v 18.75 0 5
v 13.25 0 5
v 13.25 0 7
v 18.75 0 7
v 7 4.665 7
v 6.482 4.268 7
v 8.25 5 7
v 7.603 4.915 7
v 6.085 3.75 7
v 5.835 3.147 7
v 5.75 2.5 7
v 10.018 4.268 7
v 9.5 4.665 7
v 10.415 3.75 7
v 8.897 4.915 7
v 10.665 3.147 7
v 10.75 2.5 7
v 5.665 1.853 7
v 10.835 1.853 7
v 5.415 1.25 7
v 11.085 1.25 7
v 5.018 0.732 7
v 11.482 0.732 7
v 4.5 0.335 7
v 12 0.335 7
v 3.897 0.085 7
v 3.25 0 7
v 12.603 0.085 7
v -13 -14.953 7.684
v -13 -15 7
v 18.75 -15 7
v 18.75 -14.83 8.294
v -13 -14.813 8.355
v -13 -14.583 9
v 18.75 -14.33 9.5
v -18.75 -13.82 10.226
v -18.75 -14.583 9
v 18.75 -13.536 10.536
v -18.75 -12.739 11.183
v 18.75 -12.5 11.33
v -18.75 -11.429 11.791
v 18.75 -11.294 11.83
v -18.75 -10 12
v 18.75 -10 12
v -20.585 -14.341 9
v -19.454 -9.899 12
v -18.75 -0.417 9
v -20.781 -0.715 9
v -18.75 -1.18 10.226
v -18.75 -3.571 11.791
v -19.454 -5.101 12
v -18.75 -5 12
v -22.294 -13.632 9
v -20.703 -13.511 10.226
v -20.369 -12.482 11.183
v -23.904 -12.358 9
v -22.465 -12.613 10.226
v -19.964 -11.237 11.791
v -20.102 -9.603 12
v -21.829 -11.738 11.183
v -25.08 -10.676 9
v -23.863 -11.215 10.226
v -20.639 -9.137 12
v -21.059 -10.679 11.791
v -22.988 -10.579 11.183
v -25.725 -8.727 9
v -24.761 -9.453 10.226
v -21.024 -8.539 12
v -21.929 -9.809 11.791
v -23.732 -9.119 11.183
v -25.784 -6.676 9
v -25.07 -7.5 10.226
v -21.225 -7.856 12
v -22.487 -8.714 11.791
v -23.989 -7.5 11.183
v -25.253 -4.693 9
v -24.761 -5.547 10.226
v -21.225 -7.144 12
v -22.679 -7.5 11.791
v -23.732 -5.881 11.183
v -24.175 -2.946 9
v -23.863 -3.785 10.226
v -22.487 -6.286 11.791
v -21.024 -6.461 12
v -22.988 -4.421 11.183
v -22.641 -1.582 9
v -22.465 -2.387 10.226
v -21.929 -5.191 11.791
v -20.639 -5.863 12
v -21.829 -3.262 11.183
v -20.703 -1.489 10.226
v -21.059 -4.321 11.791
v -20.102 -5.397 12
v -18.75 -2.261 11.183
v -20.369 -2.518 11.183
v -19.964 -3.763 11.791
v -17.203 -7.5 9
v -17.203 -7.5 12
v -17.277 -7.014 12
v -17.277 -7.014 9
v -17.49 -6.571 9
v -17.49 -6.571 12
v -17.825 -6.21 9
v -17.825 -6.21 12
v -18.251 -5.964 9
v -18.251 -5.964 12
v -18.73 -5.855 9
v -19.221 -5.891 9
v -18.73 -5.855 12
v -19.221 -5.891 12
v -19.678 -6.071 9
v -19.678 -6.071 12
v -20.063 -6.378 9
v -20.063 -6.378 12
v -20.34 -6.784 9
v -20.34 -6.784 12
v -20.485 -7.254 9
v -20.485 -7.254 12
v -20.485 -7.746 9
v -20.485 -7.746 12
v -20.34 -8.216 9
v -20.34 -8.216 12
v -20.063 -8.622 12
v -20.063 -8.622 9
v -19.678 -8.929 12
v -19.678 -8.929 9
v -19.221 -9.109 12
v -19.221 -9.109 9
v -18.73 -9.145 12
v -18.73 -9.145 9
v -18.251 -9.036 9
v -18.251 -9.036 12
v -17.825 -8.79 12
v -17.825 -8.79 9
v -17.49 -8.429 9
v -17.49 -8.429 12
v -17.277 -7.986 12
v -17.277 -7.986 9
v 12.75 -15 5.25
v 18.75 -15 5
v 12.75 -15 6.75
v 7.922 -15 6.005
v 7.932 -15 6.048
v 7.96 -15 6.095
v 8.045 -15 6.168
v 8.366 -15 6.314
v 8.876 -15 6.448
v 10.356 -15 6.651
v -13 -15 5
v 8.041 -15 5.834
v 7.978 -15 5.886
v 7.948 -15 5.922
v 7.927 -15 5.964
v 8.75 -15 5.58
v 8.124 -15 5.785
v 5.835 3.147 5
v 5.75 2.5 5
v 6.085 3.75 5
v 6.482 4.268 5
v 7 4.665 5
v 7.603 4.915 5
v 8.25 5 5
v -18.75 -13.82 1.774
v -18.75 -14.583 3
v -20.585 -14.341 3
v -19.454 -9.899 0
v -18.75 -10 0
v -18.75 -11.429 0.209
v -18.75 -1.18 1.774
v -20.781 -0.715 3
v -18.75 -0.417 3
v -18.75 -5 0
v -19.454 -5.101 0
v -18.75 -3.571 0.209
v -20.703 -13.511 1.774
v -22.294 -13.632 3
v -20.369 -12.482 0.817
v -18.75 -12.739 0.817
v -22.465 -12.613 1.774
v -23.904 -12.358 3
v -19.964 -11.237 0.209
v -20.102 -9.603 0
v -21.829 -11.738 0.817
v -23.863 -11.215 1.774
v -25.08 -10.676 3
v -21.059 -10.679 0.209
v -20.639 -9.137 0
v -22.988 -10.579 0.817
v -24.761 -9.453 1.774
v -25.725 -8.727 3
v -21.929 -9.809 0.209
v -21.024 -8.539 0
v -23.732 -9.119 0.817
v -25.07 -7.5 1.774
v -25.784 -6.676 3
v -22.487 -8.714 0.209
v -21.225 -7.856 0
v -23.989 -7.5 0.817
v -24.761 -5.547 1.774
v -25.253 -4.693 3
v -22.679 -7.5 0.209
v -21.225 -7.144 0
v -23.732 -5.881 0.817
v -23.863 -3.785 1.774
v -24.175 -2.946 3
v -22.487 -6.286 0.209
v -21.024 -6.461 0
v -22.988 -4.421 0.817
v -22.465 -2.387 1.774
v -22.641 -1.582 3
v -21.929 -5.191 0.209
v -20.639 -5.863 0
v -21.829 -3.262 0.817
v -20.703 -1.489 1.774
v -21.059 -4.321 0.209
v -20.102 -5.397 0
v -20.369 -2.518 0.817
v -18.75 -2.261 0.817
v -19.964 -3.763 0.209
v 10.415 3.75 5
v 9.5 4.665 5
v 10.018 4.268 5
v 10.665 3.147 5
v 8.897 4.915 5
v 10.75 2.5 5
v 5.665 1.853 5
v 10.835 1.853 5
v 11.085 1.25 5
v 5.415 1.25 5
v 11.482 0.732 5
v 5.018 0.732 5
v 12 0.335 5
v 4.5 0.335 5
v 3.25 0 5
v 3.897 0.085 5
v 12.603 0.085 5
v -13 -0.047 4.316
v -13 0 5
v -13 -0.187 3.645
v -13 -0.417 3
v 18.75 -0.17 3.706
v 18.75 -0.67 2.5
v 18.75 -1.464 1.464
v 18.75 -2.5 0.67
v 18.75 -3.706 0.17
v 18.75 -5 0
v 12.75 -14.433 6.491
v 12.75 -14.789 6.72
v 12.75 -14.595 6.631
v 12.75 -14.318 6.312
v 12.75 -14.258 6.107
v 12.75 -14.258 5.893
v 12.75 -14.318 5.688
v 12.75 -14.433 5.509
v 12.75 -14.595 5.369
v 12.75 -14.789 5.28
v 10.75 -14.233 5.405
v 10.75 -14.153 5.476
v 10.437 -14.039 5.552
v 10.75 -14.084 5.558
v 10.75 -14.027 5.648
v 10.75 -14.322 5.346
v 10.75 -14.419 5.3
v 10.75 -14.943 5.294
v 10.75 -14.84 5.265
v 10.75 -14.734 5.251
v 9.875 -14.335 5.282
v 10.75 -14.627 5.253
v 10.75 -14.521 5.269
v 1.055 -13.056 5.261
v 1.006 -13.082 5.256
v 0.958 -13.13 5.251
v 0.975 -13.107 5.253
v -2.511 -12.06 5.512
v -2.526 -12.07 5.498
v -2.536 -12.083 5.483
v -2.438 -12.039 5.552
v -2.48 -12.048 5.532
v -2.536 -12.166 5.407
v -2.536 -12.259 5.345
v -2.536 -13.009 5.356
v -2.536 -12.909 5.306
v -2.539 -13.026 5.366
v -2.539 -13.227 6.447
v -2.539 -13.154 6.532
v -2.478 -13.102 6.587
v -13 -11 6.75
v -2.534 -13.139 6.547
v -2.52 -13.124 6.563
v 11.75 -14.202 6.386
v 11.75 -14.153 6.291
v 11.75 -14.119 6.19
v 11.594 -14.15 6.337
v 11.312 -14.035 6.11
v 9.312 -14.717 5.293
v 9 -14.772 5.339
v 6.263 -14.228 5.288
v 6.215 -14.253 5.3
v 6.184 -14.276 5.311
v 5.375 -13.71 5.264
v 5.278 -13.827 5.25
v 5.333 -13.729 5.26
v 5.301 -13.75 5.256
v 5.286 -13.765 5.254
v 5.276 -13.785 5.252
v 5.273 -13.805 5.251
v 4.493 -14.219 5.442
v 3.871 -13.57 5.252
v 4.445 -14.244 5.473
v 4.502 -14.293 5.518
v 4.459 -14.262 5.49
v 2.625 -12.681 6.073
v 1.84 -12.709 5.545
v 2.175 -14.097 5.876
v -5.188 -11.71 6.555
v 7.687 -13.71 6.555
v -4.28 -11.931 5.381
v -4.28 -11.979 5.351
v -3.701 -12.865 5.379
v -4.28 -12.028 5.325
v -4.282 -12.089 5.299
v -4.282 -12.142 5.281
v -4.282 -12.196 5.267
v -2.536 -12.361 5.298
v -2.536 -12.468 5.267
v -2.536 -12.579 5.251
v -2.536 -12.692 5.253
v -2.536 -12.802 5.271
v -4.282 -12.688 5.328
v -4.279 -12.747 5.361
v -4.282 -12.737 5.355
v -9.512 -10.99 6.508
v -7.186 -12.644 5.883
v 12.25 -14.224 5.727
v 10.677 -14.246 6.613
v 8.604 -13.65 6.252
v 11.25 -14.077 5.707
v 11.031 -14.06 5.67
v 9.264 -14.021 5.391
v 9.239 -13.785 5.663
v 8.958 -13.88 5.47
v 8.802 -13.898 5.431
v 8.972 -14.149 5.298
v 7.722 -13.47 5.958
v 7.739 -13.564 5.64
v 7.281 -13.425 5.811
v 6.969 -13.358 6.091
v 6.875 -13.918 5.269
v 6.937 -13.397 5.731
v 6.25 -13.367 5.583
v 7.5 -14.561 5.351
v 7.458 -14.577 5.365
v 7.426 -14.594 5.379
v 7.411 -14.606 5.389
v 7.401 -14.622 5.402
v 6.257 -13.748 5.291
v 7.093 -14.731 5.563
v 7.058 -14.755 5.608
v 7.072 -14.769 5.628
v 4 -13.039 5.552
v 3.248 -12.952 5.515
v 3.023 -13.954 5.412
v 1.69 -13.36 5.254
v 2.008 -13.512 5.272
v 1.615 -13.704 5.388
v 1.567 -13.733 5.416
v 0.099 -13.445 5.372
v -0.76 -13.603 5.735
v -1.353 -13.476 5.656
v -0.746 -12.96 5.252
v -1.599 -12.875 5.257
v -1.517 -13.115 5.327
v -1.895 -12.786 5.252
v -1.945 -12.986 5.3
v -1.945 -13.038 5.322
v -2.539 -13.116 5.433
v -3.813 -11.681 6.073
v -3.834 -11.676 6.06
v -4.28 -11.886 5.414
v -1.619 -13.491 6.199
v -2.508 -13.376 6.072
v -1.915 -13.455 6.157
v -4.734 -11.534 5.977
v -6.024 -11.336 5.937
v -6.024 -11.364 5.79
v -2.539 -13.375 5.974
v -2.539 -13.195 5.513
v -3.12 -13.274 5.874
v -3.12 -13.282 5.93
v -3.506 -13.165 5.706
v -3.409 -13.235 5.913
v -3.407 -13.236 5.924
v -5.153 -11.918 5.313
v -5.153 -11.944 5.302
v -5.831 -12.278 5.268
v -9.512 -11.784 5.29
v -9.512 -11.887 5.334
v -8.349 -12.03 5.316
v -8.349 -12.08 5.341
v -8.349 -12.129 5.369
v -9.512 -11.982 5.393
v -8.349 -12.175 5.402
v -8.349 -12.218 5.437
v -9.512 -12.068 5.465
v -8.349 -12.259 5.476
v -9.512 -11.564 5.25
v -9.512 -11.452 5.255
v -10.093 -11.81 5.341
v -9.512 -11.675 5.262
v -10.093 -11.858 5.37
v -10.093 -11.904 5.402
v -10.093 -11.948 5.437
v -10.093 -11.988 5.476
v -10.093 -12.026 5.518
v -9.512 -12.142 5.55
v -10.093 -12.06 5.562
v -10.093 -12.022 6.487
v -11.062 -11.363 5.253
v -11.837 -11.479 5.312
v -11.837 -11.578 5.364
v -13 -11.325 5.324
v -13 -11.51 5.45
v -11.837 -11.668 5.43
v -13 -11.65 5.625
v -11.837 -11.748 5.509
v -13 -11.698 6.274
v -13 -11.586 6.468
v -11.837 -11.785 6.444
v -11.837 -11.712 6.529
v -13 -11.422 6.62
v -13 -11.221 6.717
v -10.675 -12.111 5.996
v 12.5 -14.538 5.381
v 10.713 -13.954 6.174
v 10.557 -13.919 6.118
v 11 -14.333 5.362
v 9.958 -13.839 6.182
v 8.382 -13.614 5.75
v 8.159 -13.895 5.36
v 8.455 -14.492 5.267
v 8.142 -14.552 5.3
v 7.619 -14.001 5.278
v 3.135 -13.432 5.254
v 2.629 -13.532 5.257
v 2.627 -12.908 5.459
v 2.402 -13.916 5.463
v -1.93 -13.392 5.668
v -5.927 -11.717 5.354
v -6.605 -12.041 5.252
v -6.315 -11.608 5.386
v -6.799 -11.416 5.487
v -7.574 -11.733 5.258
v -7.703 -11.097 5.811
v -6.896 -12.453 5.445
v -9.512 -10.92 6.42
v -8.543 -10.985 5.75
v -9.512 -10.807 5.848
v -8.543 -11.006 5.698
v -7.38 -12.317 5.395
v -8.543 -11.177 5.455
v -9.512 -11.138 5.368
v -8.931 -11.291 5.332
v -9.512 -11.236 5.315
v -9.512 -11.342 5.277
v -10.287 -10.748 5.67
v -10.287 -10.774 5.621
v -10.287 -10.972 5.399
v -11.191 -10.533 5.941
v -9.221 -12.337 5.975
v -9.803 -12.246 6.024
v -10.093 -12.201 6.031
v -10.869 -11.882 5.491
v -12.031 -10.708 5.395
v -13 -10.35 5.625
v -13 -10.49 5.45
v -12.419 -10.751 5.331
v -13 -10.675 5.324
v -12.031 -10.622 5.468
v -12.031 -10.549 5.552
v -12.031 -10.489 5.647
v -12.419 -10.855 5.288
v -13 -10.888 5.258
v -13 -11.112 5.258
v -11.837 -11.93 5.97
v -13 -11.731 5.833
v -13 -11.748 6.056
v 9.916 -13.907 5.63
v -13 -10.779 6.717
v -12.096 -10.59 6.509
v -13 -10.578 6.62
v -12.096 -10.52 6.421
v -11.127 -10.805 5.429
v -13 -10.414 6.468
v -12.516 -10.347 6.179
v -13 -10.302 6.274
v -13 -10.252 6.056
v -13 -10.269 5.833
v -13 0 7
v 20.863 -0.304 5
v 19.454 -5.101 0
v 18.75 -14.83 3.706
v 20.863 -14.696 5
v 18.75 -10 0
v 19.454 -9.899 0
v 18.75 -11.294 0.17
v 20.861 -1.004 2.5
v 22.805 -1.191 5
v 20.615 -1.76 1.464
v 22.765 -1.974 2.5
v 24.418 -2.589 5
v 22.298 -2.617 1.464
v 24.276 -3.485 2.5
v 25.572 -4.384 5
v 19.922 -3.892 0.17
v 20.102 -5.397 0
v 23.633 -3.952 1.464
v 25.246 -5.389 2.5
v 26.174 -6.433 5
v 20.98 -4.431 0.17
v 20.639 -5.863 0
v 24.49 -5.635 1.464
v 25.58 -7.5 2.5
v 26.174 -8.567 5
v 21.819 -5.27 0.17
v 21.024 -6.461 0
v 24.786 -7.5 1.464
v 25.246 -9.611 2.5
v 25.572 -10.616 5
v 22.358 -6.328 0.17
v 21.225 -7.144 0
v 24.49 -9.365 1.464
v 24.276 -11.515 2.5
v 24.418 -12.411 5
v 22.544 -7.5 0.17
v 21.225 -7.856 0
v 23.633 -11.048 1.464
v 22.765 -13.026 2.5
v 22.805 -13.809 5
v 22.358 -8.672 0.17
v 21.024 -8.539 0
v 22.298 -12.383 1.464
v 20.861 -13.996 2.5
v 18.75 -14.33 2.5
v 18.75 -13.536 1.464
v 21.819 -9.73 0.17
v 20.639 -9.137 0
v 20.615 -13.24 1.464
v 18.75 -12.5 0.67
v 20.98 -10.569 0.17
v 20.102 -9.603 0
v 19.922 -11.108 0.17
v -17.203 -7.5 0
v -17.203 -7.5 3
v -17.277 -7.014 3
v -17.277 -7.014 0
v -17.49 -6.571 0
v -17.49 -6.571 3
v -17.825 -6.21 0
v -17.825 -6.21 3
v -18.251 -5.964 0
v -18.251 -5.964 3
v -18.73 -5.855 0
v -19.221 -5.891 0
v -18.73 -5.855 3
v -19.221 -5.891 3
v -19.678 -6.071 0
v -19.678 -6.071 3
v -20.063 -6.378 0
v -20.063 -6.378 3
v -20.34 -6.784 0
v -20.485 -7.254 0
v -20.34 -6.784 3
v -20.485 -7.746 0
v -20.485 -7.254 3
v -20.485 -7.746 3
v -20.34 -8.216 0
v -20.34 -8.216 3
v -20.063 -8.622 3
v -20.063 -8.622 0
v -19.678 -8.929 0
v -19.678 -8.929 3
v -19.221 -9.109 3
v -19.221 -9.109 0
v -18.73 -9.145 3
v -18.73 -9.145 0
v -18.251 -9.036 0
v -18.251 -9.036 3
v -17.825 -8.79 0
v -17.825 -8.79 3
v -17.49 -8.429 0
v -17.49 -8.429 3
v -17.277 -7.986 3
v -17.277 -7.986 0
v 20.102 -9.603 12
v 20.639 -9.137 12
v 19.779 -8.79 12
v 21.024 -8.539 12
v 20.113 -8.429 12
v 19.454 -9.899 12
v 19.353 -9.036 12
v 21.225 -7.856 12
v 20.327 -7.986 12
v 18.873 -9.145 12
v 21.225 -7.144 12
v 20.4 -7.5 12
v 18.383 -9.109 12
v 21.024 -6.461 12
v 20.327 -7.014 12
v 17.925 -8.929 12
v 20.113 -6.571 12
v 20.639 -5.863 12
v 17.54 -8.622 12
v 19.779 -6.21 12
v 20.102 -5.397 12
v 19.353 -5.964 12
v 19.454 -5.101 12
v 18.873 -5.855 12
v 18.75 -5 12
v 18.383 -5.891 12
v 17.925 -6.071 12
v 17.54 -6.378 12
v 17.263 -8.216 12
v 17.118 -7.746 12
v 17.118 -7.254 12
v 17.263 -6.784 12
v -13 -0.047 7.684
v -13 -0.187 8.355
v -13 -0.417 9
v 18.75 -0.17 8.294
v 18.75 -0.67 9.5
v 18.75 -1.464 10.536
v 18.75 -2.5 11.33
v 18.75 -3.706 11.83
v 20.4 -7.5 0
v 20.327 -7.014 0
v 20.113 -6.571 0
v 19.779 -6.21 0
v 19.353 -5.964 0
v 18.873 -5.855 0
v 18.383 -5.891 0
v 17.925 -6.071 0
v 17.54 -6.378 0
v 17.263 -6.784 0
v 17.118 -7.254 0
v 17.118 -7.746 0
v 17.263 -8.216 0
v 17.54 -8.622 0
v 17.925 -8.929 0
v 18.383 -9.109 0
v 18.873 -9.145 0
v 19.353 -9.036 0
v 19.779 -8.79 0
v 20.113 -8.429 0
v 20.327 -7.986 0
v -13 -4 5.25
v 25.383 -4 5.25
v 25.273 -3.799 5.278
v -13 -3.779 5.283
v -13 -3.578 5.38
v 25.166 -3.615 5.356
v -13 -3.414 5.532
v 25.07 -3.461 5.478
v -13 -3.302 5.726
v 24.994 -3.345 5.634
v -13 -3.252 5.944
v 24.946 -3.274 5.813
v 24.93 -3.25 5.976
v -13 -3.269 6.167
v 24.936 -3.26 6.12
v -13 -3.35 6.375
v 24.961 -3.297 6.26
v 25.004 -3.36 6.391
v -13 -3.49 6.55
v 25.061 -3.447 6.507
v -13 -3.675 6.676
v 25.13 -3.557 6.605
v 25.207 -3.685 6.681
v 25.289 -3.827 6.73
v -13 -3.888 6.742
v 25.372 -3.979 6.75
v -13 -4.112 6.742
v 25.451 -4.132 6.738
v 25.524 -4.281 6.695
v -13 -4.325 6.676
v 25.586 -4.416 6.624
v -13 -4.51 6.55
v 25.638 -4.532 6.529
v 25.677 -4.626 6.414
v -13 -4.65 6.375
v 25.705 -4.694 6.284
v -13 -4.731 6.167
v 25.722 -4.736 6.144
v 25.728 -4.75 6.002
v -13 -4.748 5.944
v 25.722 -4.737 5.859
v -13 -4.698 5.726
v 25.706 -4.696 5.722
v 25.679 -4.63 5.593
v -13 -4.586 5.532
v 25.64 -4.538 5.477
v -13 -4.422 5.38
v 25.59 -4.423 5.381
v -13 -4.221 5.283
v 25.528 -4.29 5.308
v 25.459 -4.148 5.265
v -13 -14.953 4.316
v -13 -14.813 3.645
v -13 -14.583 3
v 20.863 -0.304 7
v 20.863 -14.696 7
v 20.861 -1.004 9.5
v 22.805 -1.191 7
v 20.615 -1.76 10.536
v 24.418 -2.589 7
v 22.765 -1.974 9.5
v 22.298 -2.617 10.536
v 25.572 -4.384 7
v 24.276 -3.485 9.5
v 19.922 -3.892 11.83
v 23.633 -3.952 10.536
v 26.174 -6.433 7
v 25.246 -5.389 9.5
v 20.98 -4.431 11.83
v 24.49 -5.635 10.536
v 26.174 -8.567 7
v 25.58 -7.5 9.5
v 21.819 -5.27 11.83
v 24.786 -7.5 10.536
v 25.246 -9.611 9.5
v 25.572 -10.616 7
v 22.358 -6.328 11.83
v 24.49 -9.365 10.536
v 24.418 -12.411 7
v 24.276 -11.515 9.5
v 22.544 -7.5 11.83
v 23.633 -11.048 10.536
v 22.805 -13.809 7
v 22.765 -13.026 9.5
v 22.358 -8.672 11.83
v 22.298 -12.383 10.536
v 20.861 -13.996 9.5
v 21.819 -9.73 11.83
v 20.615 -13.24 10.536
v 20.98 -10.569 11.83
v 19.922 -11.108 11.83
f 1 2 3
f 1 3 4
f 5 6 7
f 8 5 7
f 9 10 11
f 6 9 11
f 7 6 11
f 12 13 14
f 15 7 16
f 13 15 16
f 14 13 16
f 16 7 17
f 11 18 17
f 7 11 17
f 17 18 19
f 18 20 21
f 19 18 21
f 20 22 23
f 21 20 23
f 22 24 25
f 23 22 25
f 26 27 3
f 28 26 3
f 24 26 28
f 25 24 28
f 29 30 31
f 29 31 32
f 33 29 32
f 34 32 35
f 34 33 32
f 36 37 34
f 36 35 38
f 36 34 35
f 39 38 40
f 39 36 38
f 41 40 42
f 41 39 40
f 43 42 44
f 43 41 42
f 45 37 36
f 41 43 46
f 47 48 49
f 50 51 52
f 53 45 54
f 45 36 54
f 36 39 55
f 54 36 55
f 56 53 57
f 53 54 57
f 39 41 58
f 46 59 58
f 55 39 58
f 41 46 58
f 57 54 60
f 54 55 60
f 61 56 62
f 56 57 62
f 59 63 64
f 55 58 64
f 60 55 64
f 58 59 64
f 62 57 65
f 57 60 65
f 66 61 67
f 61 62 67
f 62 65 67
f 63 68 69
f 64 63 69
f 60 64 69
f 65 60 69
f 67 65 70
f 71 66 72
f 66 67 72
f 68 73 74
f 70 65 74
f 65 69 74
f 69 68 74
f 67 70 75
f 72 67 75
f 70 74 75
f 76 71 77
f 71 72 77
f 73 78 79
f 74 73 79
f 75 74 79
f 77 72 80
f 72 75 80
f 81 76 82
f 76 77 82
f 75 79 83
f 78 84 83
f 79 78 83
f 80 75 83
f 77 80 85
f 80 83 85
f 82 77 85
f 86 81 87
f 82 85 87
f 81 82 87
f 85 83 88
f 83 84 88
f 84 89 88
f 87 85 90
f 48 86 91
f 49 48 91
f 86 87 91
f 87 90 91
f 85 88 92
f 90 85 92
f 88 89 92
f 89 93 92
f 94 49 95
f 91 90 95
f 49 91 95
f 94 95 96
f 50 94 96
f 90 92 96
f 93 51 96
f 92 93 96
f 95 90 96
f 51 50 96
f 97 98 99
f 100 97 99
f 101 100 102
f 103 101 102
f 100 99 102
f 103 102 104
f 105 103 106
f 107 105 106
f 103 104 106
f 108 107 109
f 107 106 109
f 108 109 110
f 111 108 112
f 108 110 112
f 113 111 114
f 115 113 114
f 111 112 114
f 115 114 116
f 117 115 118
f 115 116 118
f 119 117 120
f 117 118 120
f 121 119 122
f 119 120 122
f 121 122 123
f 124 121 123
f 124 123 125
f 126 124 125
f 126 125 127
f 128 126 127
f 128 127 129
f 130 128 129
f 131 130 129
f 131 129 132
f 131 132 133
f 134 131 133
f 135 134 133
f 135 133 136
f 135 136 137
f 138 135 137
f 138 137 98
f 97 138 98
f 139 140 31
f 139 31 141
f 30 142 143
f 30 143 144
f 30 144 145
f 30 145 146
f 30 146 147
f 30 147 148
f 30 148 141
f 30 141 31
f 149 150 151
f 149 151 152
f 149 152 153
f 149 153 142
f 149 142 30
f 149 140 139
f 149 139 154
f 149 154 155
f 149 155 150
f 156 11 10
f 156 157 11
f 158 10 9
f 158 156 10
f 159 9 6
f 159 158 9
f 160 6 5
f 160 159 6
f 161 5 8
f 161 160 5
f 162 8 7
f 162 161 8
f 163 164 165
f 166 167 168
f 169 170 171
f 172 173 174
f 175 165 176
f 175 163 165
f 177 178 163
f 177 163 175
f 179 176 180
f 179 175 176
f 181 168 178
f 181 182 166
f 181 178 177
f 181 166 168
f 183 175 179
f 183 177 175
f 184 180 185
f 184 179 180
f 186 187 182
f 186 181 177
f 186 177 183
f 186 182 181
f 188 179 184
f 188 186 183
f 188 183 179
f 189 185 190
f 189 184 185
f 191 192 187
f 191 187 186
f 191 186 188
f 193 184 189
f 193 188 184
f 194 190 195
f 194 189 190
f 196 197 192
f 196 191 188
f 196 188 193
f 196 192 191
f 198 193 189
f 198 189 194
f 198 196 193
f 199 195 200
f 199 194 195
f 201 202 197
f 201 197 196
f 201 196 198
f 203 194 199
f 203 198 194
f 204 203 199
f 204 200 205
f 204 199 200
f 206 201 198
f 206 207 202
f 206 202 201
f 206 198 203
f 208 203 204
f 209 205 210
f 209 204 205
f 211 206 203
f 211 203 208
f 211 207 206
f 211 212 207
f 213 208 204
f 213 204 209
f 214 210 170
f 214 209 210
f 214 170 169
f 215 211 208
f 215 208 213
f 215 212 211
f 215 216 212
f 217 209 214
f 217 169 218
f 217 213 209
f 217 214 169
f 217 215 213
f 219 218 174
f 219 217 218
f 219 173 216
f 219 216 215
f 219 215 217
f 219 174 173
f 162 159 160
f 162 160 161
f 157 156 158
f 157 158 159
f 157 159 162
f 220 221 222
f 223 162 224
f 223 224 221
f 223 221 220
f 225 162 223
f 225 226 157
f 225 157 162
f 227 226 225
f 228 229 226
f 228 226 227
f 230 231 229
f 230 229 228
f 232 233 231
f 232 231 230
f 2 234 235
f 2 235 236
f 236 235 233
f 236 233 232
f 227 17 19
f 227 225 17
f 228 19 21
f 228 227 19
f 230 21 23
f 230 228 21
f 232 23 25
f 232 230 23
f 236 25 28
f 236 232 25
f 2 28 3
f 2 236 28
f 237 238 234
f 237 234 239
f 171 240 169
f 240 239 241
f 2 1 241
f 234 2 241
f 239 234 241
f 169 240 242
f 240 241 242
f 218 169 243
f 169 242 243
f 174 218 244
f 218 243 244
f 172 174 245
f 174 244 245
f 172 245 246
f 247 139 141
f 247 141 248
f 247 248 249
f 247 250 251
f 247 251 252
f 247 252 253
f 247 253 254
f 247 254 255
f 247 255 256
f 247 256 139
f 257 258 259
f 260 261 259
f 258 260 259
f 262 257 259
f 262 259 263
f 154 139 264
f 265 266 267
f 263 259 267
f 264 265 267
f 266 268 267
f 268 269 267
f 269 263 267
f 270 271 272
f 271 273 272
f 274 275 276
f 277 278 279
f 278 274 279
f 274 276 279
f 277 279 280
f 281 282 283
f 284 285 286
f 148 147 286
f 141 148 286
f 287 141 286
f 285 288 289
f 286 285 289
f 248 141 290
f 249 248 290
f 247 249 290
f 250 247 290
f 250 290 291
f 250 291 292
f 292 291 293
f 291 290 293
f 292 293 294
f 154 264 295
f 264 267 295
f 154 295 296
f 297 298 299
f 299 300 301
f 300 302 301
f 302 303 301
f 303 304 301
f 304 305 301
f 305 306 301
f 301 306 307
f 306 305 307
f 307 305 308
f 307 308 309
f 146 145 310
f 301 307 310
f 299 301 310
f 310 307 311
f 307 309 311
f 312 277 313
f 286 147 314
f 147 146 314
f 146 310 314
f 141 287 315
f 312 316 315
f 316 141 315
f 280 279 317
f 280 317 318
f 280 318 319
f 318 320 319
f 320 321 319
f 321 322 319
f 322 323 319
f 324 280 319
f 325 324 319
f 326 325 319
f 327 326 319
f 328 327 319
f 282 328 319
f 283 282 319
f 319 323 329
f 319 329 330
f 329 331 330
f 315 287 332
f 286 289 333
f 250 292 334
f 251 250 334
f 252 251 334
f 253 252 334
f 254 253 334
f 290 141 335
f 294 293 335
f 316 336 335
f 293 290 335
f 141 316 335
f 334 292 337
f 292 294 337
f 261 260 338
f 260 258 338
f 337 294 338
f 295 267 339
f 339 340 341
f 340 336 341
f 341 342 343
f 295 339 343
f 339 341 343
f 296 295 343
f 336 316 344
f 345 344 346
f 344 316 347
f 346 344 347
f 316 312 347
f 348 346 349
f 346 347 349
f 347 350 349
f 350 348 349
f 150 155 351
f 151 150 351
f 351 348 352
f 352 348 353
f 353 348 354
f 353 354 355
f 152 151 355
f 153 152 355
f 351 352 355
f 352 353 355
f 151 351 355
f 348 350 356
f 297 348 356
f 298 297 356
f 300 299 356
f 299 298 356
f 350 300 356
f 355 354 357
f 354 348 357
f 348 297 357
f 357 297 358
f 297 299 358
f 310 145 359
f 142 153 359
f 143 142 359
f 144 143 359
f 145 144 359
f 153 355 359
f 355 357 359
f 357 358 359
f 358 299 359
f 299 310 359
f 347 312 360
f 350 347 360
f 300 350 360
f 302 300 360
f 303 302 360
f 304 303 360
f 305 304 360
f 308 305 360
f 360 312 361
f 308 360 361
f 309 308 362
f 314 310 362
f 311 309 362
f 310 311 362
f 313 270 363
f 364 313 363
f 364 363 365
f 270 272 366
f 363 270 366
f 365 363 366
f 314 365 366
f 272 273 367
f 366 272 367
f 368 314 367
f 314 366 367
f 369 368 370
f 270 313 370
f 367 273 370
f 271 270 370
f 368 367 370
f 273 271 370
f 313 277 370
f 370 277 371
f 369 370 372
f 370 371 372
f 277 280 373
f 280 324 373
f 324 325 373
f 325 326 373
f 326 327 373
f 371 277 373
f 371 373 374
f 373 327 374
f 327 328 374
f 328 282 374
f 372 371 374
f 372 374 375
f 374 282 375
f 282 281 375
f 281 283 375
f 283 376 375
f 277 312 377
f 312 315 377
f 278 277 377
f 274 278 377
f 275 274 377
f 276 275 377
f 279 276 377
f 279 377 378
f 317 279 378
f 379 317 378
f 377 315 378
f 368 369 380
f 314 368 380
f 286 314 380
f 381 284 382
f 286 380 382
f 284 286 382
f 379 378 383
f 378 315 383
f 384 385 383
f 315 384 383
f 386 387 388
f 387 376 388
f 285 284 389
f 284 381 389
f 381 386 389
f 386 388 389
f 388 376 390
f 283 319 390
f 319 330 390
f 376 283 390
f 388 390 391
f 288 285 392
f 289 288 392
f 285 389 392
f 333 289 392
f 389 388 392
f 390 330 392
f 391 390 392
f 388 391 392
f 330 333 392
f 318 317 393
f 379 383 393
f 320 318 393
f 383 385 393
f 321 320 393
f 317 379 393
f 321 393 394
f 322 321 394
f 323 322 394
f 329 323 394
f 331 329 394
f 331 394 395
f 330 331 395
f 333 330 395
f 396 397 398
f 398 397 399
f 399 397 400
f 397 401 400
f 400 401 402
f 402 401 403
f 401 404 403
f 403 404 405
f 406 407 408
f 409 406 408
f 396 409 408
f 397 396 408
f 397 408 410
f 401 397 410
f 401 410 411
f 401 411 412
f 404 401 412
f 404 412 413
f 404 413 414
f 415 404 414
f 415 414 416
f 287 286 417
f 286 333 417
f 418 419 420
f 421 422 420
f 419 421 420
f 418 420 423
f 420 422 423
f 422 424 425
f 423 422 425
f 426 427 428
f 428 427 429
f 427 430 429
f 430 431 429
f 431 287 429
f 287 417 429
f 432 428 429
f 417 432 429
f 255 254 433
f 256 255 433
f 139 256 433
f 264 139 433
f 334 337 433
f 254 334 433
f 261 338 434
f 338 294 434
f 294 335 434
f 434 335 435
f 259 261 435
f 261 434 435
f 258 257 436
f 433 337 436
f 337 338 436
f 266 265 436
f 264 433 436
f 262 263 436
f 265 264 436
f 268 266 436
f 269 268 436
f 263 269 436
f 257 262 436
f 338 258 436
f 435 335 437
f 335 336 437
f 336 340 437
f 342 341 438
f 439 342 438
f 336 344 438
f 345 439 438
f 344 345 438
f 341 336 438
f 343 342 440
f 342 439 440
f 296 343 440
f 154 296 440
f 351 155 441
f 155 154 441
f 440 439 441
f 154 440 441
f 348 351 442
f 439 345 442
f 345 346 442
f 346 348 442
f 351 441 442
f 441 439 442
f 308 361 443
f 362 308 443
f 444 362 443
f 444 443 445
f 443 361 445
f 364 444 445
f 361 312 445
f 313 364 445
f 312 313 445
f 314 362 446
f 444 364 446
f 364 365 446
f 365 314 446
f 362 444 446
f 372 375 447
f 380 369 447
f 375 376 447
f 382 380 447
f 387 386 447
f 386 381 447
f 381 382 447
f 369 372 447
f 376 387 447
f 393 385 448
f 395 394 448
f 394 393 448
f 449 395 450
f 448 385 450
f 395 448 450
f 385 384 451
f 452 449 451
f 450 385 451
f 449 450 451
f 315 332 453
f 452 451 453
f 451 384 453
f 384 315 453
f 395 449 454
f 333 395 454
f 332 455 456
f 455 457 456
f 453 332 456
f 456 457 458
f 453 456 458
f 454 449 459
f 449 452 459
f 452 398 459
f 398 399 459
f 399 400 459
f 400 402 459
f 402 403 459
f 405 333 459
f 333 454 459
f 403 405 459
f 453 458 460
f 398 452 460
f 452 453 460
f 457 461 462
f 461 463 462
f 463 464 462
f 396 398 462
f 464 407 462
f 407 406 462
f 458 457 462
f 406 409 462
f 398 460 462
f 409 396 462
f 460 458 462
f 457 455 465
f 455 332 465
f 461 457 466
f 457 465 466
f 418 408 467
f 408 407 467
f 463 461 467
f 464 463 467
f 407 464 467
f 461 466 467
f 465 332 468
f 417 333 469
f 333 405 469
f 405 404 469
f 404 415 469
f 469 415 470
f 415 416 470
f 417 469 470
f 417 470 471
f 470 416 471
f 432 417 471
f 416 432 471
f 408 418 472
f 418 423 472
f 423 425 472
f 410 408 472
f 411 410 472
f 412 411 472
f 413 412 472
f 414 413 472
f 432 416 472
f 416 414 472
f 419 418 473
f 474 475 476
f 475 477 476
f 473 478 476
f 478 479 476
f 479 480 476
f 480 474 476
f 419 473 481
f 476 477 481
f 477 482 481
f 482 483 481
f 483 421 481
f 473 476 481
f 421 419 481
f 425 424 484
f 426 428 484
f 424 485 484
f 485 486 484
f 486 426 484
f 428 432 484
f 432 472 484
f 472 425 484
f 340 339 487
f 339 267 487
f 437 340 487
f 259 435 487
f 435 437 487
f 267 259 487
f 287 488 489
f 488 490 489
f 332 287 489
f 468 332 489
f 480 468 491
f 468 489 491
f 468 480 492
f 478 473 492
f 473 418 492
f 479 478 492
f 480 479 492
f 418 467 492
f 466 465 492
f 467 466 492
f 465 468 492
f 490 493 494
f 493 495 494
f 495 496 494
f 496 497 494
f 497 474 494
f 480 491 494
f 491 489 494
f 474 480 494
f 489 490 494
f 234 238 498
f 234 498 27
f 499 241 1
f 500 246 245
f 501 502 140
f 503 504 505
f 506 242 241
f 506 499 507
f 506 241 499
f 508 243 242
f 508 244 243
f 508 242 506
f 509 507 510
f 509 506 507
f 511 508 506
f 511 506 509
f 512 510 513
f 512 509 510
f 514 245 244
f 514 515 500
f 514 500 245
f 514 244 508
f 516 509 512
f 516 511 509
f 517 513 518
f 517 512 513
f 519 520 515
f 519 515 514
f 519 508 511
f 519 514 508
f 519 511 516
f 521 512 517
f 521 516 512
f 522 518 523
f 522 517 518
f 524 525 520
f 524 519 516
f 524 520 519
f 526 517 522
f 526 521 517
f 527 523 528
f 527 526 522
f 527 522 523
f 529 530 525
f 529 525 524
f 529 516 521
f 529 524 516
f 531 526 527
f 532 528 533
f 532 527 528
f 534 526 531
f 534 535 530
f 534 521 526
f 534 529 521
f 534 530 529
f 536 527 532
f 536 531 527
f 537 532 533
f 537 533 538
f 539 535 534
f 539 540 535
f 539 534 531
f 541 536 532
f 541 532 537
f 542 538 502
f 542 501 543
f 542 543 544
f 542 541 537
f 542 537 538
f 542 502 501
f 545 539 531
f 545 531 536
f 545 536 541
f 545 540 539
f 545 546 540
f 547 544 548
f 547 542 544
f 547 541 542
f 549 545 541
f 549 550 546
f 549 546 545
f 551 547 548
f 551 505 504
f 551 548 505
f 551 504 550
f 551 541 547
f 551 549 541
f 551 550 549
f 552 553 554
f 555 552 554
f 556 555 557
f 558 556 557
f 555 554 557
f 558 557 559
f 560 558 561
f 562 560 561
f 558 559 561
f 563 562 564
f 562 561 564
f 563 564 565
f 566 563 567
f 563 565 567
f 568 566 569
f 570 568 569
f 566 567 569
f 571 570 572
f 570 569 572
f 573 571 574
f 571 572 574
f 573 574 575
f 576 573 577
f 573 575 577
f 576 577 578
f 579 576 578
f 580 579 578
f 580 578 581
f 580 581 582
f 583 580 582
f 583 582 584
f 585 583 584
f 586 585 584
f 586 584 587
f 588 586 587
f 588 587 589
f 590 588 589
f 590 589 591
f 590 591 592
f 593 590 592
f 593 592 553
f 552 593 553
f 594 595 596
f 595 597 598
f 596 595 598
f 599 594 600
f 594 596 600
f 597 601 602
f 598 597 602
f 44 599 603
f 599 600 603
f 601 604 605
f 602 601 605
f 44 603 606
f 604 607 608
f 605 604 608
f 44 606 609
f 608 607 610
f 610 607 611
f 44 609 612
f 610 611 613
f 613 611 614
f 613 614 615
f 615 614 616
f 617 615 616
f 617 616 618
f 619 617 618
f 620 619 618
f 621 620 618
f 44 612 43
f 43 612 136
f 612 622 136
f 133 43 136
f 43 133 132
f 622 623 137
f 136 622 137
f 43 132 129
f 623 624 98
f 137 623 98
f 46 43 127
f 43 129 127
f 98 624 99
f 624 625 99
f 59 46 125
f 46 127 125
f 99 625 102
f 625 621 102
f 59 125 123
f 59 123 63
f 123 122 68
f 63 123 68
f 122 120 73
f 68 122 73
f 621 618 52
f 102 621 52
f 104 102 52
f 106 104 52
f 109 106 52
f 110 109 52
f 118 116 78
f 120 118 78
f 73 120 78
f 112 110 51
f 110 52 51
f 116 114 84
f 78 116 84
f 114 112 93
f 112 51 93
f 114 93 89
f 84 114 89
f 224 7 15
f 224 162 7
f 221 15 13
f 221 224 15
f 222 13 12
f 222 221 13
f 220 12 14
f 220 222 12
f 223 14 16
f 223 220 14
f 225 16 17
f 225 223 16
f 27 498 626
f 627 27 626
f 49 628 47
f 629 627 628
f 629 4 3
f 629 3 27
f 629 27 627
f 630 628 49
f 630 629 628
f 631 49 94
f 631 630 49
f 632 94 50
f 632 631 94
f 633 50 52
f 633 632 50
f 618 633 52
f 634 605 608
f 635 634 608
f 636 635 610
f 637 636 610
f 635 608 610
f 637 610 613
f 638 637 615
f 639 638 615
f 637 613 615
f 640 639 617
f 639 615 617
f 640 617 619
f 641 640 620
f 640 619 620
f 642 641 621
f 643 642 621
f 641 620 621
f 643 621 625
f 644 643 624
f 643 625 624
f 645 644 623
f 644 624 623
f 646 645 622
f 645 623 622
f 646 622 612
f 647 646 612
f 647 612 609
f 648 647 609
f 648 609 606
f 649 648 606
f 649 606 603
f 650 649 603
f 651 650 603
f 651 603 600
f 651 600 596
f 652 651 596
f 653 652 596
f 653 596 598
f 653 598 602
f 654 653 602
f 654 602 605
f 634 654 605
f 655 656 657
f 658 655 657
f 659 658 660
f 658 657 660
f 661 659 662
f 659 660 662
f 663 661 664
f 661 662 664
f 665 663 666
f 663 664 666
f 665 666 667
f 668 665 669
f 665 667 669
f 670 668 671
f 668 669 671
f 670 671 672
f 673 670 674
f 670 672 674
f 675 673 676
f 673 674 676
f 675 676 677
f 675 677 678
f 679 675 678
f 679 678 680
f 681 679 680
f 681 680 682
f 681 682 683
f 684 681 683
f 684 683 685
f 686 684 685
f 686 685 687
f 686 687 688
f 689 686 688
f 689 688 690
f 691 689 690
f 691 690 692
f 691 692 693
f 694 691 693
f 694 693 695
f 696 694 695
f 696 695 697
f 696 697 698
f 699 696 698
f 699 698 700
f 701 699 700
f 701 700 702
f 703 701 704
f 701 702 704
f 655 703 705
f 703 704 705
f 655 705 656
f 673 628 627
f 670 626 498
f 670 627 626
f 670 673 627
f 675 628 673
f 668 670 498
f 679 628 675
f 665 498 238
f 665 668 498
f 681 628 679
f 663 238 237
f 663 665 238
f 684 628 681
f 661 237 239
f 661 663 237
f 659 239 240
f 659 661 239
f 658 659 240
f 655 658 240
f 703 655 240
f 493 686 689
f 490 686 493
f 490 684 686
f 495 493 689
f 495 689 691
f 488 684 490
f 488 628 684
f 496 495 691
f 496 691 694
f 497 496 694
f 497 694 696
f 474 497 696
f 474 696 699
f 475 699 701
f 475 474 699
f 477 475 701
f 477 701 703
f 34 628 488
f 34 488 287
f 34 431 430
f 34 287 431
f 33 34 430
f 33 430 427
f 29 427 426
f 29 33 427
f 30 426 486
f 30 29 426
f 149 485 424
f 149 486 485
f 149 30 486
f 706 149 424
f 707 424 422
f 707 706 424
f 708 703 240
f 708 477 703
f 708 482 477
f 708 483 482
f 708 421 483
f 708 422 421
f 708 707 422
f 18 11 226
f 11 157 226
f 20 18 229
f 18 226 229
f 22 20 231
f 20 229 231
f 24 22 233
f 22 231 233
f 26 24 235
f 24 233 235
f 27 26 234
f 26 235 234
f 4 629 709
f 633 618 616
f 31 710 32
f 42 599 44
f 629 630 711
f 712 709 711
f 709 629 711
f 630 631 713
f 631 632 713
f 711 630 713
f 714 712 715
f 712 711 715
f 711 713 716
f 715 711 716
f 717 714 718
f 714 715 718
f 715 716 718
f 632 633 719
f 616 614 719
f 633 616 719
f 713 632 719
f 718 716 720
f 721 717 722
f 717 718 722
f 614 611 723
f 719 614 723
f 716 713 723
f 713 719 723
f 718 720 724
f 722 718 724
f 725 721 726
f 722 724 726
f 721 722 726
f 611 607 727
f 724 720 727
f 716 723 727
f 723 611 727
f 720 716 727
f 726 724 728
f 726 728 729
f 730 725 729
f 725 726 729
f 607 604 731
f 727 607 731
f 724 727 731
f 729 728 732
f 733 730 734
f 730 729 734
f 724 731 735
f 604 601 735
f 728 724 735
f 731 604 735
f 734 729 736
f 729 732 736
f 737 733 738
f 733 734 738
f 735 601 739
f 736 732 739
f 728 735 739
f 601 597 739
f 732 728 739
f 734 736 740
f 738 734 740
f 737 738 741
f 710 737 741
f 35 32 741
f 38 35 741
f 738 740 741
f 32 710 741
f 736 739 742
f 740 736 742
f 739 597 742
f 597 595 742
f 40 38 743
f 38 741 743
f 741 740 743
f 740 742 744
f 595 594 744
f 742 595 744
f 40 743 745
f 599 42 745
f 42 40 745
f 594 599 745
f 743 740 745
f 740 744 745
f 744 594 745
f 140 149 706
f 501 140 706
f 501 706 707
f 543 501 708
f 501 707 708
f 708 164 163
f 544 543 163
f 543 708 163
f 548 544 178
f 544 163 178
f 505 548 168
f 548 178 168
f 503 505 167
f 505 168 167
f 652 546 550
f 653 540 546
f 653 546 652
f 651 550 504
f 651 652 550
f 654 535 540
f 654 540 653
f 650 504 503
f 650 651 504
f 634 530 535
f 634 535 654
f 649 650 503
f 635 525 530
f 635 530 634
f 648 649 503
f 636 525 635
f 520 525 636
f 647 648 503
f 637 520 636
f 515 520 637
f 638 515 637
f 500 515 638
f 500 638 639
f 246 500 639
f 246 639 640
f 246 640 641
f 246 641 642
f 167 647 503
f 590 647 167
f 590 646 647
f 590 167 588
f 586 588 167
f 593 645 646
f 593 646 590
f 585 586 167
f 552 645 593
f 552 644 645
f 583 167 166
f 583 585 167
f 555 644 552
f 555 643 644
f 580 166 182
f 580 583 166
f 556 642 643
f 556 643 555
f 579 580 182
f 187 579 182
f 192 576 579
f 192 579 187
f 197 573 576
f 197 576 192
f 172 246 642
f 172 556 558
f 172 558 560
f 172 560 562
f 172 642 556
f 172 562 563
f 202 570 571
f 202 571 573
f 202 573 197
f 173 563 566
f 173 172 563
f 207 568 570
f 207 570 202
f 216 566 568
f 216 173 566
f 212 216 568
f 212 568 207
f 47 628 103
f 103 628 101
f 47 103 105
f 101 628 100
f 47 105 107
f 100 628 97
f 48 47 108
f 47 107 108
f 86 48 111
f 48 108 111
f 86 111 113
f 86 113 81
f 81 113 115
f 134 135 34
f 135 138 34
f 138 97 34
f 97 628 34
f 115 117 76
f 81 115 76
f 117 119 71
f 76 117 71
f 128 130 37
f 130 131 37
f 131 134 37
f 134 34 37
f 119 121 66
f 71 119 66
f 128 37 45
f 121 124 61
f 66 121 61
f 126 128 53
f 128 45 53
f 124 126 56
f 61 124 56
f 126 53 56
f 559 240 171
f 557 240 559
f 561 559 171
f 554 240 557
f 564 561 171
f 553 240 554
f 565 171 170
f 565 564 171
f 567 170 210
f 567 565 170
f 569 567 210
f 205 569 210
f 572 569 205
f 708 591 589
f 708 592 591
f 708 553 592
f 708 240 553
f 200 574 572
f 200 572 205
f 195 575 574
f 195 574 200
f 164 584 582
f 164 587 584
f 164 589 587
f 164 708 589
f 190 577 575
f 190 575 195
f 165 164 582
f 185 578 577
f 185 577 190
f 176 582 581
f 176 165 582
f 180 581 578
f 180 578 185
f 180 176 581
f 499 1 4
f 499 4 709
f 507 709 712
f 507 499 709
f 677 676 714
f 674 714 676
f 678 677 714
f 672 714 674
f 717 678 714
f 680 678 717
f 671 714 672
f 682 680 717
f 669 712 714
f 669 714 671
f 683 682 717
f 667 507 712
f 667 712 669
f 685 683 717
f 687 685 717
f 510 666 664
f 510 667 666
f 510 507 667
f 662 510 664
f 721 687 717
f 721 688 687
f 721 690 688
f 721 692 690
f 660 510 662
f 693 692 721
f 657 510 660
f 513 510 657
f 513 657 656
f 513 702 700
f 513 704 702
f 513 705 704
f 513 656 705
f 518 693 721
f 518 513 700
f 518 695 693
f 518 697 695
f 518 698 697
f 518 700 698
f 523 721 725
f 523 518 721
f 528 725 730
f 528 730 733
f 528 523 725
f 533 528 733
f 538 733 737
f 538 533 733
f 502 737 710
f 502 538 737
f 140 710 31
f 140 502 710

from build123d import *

# Parameters (mm, degrees)
BOSS_EXTRUDE1_DEPTH = 12
FILLET1_R           = 5
SKETCH5_W           = 13.25
SKETCH5_H           = 6
CUT_EXTRUDE3_DEPTH  = 39.184584586
SKETCH6_W           = 5
SKETCH6_H           = 2
BOSS_EXTRUDE2_DEPTH = 5
FILLET2_R           = 2.5
FILLET3_R           = 2.5
SKETCH3_R           = 1.65
CUT_EXTRUDE4_DEPTH  = 33.5278727
SKETCH8_R           = 0.75
CUT_EXTRUDE7_DEPTH  = 56.512113127
SKETCH9_R           = 0.75
CUT_EXTRUDE9_DEPTH  = 26.058827679


with BuildPart() as part:
    # Sketch2 → Boss-Extrude1 (new body)
    with BuildSketch(Plane.XY):
        with BuildLine():
            Line((-18.75, 0), (18.75, 0))
            ThreePointArc((18.75, 0), (26.25, -7.5), (18.75, -15))
            Line((18.75, -15), (-18.75, -15))
            ThreePointArc((-18.75, -15), (-26.25, -7.5), (-18.75, 0))
        make_face()
    extrude(amount=BOSS_EXTRUDE1_DEPTH)

    # Fillet1
    fillet1_edges = [part.edges().sort_by_distance(p)[0] for p in [
        (-26.25, -7.5, 12),
        (0, -15, 12),
        (26.25, -7.5, 12),
        (0, -15, 0),
        (-26.25, -7.5, 0),
        (0, 0, 0),
        (26.25, -7.5, 0),
        (0, 0, 12),
    ]]
    fillet(fillet1_edges, radius=FILLET1_R)

    # Sketch5 → Cut-Extrude3 (cut, through all)
    with BuildSketch(Plane(origin=(0, -25, 0), x_dir=(-1, 0, 0), z_dir=(0, -1, 0))):
        with Locations((19.625, -6)):
            Rectangle(SKETCH5_W, SKETCH5_H)
    extrude(amount=-CUT_EXTRUDE3_DEPTH, mode=Mode.SUBTRACT)

    # Sketch6 → Boss-Extrude2 (add)
    with BuildSketch(Plane(origin=(0, 0, 0), x_dir=(1, 0, 0), z_dir=(0, 1, 0))):
        with Locations((8.25, -6)):
            Rectangle(SKETCH6_W, SKETCH6_H)
    extrude(amount=BOSS_EXTRUDE2_DEPTH)

    # Fillet2
    fillet2_edges = [part.edges().sort_by_distance(p)[0] for p in [
        (10.75, 5, 6),
        (5.75, 5, 6),
    ]]
    fillet(fillet2_edges, radius=FILLET2_R - 0.0001)  # a hair under: the kernel refuses the full size

    # Fillet3
    fillet3_edges = [part.edges().sort_by_distance(p)[0] for p in [
        (5.75, 0, 6),
        (10.75, 0, 6),
    ]]
    fillet(fillet3_edges, radius=FILLET3_R)

    # Sketch3 → Cut-Extrude4 (cut, through all)
    with BuildSketch(Plane.XY.offset(12)):
        with Locations((-18.853477977, -7.5)):
            Circle(SKETCH3_R)
        with Locations((18.75, -7.5)):
            Circle(SKETCH3_R)
    extrude(amount=-CUT_EXTRUDE4_DEPTH, mode=Mode.SUBTRACT)

    # Sketch8 → Cut-Extrude7 (cut, through all)
    with BuildSketch(Plane(origin=(26.25, 0, 0), x_dir=(0, 0, -1), z_dir=(1, 0, 0))):
        with Locations((-6, -4)):
            Circle(SKETCH8_R)
    extrude(amount=-CUT_EXTRUDE7_DEPTH, mode=Mode.SUBTRACT)

    # Sketch9 → Cut-Extrude9 (cut, along a direction that is not the sketch's normal)
    with BuildSketch(Plane.ZY.offset(13)):
        with Locations((6, -11)):
            Circle(SKETCH9_R)
    extrude(amount=-CUT_EXTRUDE9_DEPTH, dir=(-0.988148826849317, 0.15349884688921422, 0), mode=Mode.SUBTRACT)


solid = part.part
